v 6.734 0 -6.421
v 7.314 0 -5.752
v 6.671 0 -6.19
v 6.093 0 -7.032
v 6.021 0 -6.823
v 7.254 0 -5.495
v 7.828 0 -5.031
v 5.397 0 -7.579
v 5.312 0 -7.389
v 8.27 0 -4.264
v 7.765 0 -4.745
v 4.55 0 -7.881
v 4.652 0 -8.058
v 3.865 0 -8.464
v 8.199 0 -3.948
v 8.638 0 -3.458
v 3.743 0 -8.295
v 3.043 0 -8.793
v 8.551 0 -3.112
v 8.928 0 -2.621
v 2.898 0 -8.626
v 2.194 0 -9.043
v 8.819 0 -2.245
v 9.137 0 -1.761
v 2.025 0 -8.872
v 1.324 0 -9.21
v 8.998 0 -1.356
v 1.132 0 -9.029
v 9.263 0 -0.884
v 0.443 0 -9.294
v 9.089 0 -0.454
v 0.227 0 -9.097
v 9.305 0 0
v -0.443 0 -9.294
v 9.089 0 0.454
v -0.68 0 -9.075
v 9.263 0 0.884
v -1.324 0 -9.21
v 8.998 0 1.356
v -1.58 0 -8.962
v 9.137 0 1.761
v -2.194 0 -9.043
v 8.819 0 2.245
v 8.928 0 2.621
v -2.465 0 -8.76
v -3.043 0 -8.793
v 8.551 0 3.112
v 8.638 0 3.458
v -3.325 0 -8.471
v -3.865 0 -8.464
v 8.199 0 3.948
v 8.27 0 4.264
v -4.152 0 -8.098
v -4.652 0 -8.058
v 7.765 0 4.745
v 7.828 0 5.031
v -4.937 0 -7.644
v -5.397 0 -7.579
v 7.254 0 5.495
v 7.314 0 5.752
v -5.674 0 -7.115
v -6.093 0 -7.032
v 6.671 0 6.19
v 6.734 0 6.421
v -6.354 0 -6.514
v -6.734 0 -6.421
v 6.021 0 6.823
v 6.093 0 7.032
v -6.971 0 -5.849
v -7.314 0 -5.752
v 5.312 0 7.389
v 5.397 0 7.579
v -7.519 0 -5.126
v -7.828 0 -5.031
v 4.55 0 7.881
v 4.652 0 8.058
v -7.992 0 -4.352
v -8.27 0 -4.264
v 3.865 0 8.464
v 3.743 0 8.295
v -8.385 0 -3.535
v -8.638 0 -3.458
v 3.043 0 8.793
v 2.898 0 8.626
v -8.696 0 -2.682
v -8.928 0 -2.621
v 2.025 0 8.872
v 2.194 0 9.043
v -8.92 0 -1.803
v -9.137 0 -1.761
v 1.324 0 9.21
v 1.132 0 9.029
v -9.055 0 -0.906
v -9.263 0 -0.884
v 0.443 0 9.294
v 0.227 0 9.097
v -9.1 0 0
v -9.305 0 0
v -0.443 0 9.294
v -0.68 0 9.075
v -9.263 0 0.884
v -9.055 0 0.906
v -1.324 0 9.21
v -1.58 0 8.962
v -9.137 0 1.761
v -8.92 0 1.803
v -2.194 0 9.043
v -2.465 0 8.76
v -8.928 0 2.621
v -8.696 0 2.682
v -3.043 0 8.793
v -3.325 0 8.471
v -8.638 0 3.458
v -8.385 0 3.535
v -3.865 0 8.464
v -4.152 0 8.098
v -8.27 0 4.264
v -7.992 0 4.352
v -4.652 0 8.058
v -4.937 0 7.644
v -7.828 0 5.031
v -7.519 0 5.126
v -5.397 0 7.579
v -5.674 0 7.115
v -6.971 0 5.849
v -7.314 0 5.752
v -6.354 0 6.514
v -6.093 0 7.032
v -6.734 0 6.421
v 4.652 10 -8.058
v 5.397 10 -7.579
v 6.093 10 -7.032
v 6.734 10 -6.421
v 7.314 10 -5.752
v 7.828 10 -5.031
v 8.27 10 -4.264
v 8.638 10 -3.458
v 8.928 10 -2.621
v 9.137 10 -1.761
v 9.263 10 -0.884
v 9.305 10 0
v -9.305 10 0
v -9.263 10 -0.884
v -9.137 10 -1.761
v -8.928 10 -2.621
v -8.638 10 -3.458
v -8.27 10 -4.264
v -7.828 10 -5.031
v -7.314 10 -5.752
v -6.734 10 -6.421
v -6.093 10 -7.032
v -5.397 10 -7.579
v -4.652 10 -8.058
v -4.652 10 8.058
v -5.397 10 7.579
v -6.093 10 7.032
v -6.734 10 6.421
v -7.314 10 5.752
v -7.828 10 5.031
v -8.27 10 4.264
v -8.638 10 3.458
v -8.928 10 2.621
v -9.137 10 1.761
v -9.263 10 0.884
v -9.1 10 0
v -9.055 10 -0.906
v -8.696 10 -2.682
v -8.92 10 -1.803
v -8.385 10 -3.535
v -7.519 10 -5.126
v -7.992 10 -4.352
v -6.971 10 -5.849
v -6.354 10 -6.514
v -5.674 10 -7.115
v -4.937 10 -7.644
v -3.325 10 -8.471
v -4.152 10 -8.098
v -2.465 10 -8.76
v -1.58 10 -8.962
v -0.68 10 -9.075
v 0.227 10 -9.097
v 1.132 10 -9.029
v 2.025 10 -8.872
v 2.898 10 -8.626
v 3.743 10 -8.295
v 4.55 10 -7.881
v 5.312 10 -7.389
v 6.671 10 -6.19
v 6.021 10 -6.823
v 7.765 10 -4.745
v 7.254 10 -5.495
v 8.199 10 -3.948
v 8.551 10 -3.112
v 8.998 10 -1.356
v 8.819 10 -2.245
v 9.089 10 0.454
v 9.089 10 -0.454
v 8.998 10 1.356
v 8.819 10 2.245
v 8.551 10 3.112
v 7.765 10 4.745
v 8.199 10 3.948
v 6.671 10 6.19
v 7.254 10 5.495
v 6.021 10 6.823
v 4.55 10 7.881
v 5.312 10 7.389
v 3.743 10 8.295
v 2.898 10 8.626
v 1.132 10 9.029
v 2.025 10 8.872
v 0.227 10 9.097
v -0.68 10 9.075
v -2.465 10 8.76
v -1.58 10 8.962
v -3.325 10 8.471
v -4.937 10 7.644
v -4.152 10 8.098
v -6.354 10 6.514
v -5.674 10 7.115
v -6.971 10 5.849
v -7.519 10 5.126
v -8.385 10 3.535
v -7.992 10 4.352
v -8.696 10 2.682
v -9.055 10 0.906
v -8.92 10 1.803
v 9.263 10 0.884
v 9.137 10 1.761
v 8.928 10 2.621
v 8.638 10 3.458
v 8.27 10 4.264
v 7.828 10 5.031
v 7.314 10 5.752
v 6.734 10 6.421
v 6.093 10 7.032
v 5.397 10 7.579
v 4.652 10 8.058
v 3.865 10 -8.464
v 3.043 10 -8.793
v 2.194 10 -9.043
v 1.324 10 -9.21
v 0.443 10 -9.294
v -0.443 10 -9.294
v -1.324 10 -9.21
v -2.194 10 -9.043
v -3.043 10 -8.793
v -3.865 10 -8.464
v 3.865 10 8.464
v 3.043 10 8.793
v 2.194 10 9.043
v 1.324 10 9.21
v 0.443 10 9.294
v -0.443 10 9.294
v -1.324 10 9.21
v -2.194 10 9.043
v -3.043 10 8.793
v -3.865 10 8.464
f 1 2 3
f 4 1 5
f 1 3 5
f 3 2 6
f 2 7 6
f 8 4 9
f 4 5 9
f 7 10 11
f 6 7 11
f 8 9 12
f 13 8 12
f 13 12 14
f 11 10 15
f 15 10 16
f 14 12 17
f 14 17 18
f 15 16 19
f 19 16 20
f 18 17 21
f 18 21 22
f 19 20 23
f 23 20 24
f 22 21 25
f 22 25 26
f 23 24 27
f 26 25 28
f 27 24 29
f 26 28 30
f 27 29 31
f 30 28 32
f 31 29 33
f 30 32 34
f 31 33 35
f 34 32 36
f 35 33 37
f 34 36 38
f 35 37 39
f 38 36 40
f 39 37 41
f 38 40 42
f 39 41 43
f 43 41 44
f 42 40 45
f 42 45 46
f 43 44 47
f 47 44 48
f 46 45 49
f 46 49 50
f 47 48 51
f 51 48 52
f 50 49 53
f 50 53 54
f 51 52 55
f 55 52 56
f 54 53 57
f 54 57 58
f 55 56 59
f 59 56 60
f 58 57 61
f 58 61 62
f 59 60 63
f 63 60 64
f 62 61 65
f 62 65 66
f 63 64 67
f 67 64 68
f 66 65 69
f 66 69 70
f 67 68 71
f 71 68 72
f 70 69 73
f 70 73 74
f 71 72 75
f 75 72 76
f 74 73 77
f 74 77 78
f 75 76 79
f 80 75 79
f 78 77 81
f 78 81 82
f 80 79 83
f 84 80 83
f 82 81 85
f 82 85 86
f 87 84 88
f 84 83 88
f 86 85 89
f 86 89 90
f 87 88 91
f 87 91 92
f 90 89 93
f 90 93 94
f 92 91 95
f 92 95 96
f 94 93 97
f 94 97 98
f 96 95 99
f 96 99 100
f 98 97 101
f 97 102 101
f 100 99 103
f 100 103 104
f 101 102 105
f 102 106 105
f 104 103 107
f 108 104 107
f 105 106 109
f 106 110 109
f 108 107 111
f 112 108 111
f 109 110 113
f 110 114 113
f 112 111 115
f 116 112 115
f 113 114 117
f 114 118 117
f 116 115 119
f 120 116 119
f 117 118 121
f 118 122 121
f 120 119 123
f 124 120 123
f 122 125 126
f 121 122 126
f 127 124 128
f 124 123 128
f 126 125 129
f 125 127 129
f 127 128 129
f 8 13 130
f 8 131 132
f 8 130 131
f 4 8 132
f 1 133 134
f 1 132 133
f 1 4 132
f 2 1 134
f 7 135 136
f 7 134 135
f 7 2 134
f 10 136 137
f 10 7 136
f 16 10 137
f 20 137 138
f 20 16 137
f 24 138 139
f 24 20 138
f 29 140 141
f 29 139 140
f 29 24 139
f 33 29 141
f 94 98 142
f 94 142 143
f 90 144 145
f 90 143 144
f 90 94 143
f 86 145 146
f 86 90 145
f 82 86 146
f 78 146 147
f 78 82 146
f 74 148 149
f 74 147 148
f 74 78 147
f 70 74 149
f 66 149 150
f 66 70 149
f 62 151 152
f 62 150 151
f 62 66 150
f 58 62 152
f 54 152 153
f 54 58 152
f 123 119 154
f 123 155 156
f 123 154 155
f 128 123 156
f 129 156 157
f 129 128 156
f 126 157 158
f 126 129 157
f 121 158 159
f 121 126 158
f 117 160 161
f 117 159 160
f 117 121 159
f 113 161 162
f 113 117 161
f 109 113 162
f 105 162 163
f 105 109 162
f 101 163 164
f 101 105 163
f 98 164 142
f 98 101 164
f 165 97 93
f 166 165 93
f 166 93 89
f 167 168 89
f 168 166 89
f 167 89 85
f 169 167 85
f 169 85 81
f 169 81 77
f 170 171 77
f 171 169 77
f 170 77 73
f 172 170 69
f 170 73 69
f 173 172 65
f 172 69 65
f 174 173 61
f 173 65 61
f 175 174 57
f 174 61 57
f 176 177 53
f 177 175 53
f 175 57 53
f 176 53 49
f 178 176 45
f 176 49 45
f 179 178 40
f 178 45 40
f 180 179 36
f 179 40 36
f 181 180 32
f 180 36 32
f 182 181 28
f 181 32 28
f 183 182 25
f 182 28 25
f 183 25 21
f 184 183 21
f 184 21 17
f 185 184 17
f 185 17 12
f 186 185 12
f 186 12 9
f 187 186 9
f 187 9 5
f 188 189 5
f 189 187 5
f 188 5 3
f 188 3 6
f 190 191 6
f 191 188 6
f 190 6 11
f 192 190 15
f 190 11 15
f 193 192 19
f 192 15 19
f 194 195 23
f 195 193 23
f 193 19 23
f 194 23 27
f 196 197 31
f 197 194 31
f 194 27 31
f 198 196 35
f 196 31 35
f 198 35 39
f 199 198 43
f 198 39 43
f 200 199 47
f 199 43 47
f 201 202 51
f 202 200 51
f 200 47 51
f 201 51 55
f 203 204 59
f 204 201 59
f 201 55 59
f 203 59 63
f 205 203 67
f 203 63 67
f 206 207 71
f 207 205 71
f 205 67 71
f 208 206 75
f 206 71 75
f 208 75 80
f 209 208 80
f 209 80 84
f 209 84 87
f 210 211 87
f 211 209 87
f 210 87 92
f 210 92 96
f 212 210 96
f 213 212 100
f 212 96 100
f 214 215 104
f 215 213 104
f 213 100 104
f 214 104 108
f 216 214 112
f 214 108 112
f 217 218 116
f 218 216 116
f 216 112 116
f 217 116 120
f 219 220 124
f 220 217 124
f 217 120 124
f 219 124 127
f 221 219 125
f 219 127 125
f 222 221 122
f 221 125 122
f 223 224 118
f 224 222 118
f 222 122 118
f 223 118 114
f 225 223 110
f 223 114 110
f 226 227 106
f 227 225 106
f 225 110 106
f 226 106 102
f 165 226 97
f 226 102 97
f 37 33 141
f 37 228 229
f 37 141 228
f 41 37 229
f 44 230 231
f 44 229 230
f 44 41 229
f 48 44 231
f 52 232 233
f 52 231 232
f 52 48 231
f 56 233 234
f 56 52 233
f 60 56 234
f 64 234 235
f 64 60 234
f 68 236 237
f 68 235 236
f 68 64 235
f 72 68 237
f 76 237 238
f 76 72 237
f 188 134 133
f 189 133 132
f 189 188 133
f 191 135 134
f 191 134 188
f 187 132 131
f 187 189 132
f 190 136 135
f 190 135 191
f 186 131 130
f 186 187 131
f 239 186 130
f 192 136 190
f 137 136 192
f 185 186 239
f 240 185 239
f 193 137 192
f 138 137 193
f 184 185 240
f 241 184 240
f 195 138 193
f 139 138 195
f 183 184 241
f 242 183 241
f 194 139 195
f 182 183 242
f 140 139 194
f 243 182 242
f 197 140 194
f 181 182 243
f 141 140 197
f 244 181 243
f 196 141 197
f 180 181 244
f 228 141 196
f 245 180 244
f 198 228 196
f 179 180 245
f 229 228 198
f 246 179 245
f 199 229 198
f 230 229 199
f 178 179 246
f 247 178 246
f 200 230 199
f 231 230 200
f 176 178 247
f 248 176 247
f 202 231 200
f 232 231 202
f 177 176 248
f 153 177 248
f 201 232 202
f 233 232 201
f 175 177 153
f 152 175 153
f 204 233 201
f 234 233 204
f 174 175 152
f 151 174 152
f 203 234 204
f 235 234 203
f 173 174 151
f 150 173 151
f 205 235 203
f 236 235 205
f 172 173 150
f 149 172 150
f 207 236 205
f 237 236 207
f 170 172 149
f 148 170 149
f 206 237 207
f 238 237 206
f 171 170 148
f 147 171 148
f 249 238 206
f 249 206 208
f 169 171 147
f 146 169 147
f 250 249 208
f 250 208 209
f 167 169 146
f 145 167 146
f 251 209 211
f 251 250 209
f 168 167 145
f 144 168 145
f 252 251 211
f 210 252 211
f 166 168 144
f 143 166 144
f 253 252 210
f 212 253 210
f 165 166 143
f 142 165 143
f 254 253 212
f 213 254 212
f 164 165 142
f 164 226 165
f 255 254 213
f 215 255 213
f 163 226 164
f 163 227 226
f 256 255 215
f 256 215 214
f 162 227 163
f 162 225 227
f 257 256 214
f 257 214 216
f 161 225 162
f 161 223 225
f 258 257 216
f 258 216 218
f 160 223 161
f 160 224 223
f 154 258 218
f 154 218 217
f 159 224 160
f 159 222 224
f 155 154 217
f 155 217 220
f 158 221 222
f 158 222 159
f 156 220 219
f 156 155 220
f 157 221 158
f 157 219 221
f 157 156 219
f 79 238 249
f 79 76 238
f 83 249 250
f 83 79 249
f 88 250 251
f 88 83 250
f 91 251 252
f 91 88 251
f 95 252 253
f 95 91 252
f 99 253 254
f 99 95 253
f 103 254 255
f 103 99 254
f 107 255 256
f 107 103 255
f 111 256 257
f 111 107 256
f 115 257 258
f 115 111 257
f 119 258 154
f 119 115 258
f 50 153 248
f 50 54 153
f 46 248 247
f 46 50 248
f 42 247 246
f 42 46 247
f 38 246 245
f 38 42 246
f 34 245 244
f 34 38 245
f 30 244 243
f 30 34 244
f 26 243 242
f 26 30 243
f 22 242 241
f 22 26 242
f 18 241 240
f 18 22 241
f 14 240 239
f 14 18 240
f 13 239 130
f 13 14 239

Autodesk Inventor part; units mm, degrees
ref_plane "YZ Plane" through (0, 0, 0) normal (1, 0, 0) x (0, 1, 0)
ref_plane "XZ Plane" through (0, 0, 0) normal (0, 1, 0) x (-1, 0, 0)
ref_plane "XY Plane" through (0, 0, 0) normal (0, 0, 1) x (1, 0, 0)
sketch "Эскиз1" plane through (0, 0, 0) normal (0, 1, 0) x (-1, 0, 0)
  circle A0 centre (0, 0) radius 9.1
  line L0 (0, -10.7442) -> (-9.3048, -5.3721)
  line L1 (-9.3048, -5.3721) -> (-9.3048, 5.3721)
  line L2 (-9.3048, 5.3721) -> (0, 10.7442)
  line L3 (0, 10.7442) -> (9.3048, 5.3721)
  line L4 (9.3048, 5.3721) -> (9.3048, -5.3721)
  line L5 (9.3048, -5.3721) -> (0, -10.7442)
  circle A1 centre (0, 0) radius 9.3048
  dimension "d0" = 18.2
extrude "Выдавливание1" add sketch "Эскиз1" along normal blind 10 contours A1
properties part number "18650"
